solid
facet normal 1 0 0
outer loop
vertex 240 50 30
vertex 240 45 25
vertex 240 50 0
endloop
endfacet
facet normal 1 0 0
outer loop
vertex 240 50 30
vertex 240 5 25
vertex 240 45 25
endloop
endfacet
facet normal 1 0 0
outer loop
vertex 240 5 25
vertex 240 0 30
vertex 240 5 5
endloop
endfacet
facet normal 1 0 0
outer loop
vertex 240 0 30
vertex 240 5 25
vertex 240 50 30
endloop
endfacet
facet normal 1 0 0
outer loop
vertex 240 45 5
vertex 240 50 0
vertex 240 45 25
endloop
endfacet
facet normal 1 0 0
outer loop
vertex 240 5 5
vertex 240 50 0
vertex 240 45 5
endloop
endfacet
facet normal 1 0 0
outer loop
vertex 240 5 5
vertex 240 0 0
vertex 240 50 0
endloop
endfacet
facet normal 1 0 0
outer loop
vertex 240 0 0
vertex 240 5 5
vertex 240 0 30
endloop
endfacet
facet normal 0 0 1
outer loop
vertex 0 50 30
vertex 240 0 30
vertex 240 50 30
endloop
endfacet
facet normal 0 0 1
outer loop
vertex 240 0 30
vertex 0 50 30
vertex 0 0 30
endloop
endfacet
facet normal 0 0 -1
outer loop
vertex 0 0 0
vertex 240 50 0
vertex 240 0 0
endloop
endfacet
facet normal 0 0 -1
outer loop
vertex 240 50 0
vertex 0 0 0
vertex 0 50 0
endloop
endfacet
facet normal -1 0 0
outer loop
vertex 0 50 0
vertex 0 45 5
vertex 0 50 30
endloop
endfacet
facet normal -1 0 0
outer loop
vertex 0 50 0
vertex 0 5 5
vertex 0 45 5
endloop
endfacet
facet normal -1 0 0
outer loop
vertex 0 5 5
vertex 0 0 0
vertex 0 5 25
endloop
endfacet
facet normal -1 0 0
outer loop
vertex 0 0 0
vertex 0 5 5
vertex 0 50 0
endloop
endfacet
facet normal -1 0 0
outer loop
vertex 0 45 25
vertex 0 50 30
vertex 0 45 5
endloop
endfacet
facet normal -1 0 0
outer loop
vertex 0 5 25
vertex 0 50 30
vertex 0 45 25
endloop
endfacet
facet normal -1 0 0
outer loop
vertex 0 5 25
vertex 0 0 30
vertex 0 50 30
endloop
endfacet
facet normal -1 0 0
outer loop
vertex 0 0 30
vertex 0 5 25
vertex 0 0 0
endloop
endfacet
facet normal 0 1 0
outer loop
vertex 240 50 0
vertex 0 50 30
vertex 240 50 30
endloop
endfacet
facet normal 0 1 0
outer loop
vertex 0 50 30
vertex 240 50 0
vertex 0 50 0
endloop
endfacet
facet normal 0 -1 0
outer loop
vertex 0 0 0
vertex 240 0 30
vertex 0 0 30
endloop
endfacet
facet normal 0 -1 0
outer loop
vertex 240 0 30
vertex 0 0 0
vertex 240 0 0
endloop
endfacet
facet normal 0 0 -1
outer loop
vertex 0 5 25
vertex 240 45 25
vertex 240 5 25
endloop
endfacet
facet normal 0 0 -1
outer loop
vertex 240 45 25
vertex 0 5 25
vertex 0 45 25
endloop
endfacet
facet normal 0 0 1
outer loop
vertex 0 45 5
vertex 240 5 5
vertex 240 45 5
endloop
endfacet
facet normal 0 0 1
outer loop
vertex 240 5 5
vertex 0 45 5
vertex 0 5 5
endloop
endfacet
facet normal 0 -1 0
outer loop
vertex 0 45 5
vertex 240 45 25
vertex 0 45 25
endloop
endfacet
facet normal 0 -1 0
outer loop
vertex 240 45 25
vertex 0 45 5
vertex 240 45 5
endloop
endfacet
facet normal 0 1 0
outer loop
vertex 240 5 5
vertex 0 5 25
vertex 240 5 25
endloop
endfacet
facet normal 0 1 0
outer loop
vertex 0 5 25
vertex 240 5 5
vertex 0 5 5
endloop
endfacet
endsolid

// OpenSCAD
$fn = 32;

// ----------------------------------------------------------------------
// Box beam: 200-250 mm hollow beam
// ----------------------------------------------------------------------

// --- parameters (mm) ---
beam_l = 240;             // beam length, X
beam_w = 50;              // beam width, Y
beam_h = 30;              // beam height, Z
wall = 5;                 // wall thickness

difference() {
  cube([beam_l, beam_w, beam_h]);
  translate([-1, wall, wall])
    cube([beam_l + 2, beam_w - 2 * wall, beam_h - 2 * wall]);
}
